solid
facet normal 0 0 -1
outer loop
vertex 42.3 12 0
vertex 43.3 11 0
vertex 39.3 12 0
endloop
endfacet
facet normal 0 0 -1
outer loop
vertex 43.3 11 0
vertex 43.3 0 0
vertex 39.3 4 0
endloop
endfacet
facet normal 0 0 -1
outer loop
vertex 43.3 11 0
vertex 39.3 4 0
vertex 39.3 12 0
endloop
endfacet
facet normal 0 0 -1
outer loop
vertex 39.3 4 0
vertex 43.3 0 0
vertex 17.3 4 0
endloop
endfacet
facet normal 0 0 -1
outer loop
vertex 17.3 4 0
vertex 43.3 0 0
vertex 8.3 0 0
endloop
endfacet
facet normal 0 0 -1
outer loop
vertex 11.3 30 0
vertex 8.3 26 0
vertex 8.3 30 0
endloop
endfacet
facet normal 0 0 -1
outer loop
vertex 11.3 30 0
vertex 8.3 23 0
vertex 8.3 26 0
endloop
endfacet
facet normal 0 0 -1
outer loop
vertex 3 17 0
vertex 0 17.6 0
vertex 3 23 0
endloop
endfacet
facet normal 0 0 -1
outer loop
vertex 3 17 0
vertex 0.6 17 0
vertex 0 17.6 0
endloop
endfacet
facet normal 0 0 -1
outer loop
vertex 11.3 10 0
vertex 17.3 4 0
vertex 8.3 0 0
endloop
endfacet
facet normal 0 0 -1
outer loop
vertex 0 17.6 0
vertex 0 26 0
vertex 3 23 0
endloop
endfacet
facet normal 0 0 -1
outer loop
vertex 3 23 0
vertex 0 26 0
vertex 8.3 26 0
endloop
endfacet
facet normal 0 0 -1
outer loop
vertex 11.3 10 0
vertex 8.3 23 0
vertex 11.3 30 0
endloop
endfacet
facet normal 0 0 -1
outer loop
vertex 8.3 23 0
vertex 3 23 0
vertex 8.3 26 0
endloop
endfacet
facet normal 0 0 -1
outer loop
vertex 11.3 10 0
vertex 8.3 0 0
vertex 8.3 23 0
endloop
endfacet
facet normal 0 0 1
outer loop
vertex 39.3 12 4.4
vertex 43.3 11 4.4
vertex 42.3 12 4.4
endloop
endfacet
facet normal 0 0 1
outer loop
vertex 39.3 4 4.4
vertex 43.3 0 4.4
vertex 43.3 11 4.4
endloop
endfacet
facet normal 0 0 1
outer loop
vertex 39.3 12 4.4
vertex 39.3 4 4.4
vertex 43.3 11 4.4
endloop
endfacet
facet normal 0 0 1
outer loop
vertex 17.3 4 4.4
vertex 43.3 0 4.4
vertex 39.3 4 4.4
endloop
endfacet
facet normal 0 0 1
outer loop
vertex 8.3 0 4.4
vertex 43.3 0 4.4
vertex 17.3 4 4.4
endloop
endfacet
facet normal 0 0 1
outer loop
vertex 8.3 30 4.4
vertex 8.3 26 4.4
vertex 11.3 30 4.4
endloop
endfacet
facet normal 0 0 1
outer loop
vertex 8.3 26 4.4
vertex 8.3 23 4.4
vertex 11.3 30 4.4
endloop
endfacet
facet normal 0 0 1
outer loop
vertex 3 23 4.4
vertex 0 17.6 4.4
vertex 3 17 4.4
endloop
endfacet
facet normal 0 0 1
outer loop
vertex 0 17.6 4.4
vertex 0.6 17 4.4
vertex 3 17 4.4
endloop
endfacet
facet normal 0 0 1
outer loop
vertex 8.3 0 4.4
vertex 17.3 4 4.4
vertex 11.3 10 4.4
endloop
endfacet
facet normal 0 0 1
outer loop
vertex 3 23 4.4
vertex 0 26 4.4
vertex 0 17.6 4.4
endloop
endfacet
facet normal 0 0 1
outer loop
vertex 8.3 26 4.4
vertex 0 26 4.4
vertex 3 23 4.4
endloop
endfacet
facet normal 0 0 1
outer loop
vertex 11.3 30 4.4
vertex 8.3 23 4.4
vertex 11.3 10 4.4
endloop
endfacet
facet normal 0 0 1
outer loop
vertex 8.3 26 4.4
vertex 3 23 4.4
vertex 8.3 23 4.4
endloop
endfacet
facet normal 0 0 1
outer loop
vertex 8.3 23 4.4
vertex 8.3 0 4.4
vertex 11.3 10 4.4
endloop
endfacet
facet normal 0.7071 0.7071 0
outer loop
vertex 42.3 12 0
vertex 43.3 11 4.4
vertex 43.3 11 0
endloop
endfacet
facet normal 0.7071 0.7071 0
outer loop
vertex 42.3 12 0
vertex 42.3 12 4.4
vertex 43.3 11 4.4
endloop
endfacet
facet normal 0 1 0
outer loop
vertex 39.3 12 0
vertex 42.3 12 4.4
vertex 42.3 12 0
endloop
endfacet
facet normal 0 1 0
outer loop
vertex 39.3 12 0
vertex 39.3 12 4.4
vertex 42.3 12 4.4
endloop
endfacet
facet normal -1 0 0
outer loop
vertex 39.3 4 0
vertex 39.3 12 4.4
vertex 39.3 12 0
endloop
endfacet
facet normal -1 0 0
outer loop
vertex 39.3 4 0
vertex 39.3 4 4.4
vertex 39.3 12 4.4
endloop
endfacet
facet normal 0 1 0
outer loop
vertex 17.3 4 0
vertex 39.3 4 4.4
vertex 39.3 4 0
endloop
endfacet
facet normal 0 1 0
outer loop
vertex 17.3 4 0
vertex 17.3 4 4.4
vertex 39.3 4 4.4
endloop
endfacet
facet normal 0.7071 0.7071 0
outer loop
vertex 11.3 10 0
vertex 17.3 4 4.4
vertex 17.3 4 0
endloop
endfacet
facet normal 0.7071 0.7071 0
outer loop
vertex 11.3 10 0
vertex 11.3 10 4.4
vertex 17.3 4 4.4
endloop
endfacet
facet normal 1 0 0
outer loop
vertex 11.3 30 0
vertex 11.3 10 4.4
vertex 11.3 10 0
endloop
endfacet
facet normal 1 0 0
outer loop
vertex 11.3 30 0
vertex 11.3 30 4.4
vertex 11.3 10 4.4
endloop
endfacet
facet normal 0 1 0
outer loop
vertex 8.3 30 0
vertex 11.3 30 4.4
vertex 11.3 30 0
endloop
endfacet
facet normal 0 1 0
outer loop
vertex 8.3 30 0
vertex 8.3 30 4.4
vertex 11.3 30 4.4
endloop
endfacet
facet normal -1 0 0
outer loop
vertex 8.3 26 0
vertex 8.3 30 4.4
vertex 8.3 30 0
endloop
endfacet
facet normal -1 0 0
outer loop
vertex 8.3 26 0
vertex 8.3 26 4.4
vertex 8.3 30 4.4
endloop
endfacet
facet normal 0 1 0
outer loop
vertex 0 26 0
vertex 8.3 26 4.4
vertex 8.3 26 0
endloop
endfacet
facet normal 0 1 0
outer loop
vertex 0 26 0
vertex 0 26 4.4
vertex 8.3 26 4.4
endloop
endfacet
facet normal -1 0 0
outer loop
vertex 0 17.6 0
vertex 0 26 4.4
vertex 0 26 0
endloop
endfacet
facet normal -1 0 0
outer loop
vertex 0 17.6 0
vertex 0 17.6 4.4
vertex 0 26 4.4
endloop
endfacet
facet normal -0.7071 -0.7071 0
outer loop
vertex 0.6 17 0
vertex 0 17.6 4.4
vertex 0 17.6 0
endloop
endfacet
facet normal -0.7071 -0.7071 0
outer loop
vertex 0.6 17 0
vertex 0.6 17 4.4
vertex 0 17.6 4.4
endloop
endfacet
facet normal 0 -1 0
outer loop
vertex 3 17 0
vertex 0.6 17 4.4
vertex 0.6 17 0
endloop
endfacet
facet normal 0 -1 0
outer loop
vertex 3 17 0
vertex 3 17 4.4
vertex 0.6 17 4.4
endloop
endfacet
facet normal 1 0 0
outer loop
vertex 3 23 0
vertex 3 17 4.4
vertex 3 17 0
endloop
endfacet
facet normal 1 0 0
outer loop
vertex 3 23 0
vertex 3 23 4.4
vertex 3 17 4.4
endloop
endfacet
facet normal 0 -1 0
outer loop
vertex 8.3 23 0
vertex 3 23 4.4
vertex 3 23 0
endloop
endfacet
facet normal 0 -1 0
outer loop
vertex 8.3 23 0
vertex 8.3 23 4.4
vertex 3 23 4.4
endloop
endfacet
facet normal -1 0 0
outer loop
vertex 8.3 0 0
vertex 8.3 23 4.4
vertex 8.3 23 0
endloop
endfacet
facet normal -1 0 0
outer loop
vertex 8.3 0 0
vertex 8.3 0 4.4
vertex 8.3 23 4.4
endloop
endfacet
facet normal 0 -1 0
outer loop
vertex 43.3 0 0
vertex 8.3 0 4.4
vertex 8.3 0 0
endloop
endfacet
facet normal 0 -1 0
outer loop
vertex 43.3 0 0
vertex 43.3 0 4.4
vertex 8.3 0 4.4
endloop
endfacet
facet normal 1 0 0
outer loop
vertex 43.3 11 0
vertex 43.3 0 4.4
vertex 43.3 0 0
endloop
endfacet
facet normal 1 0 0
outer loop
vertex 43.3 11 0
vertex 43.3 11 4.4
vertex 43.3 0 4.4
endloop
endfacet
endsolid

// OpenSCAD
// SKADIS J-hook for keys, scissors or a small cable coil.
// Print flat on its broad side as laid out, without supports; 4 perimeters.
// Insert the rear tooth through a slot, then lower until the neck seats.
// Lift before withdrawing. PETG or PLA; intended for light items.
// Dimensions: nominal 5 x 15 mm obround slots, 5 mm board thickness.
// Adjacent columns: 20 mm; alternate columns offset vertically by 20 mm.
// Same-height slots and same-column slots repeat every 40 mm.
// Measurement references (geometry below is original, not copied):
// https://www.reddit.com/r/ikeahacks/comments/rk2qk0/
// https://www.printables.com/model/109009-ikea-skadis-hook-hacek-10mm-100mm
// https://github.com/sebasdv/skadisgen (staggered grid only).
// Print the small hook first to tune fit; physical fit/load not yet tested.

reach = 28; // Clear depth from front spine to outer lip, mm [18:1:40]
lip_height = 12; // Height of the retaining lip, mm [9:1:18]
arm_thickness = 4; // Lower arm thickness in side profile, mm [3:0.5:6]
board_thickness = 5; // Measured board thickness, mm [4.6:0.1:5.4]
tolerance = 0.3; // Clearance per slot side and behind board, mm [0.2:0.05:0.4]

slot_width = 5; // Nominal slot width, mm
clip_width = slot_width-2*tolerance; // Blade thickness across slot, mm
board_gap = board_thickness+tolerance; // Clearance behind front bearing face, mm


// Shared SKADIS profile, in [depth from board, height] coordinates.
// Front bearing face is depth 0; board occupies depth -board_thickness..0.
// A 3 mm neck at height 23..26 passes through the slot; the rear tooth
// reaches height 17, extending 6 mm below the neck to catch behind the board.
// Centre the 9 mm tall tooth in the slot's 10 mm straight middle to insert.
// At default tolerance its 4.4 mm width leaves 0.3 mm on each slot side;
// board_gap leaves another 0.3 mm behind the board before pulling forward.
// Lower until the neck corners bear on the rounded slot bottom (contact is
// intentional). Lift about 8 mm at default fit to centre the tooth for removal.
// Verified against a separate 5 x 15 mm obround-slot board via the dev API;
// Insertion/lowering clear; withdrawal catches. See docs/example-feedback/skadis.md.
module skadis_clip_outline() {
    polygon([[0,0],[3,0],[3,30],[0,30],[0,26],
             [-board_gap-3,26],[-board_gap-3,17.6],
             [-board_gap-2.4,17],[-board_gap,17],
             [-board_gap,23],[0,23]]);
}

color("#5ccfc0") translate([board_gap+3,0,0])
    linear_extrude(clip_width)
        union() {
            skadis_clip_outline();
            polygon([[2,0],[reach+7,0],[reach+7,lip_height-1],
                     [reach+6,lip_height],[reach+3,lip_height],
                     [reach+3,arm_thickness],[9,arm_thickness],
                     [3,arm_thickness+6],[2,arm_thickness+6]]);
        }
